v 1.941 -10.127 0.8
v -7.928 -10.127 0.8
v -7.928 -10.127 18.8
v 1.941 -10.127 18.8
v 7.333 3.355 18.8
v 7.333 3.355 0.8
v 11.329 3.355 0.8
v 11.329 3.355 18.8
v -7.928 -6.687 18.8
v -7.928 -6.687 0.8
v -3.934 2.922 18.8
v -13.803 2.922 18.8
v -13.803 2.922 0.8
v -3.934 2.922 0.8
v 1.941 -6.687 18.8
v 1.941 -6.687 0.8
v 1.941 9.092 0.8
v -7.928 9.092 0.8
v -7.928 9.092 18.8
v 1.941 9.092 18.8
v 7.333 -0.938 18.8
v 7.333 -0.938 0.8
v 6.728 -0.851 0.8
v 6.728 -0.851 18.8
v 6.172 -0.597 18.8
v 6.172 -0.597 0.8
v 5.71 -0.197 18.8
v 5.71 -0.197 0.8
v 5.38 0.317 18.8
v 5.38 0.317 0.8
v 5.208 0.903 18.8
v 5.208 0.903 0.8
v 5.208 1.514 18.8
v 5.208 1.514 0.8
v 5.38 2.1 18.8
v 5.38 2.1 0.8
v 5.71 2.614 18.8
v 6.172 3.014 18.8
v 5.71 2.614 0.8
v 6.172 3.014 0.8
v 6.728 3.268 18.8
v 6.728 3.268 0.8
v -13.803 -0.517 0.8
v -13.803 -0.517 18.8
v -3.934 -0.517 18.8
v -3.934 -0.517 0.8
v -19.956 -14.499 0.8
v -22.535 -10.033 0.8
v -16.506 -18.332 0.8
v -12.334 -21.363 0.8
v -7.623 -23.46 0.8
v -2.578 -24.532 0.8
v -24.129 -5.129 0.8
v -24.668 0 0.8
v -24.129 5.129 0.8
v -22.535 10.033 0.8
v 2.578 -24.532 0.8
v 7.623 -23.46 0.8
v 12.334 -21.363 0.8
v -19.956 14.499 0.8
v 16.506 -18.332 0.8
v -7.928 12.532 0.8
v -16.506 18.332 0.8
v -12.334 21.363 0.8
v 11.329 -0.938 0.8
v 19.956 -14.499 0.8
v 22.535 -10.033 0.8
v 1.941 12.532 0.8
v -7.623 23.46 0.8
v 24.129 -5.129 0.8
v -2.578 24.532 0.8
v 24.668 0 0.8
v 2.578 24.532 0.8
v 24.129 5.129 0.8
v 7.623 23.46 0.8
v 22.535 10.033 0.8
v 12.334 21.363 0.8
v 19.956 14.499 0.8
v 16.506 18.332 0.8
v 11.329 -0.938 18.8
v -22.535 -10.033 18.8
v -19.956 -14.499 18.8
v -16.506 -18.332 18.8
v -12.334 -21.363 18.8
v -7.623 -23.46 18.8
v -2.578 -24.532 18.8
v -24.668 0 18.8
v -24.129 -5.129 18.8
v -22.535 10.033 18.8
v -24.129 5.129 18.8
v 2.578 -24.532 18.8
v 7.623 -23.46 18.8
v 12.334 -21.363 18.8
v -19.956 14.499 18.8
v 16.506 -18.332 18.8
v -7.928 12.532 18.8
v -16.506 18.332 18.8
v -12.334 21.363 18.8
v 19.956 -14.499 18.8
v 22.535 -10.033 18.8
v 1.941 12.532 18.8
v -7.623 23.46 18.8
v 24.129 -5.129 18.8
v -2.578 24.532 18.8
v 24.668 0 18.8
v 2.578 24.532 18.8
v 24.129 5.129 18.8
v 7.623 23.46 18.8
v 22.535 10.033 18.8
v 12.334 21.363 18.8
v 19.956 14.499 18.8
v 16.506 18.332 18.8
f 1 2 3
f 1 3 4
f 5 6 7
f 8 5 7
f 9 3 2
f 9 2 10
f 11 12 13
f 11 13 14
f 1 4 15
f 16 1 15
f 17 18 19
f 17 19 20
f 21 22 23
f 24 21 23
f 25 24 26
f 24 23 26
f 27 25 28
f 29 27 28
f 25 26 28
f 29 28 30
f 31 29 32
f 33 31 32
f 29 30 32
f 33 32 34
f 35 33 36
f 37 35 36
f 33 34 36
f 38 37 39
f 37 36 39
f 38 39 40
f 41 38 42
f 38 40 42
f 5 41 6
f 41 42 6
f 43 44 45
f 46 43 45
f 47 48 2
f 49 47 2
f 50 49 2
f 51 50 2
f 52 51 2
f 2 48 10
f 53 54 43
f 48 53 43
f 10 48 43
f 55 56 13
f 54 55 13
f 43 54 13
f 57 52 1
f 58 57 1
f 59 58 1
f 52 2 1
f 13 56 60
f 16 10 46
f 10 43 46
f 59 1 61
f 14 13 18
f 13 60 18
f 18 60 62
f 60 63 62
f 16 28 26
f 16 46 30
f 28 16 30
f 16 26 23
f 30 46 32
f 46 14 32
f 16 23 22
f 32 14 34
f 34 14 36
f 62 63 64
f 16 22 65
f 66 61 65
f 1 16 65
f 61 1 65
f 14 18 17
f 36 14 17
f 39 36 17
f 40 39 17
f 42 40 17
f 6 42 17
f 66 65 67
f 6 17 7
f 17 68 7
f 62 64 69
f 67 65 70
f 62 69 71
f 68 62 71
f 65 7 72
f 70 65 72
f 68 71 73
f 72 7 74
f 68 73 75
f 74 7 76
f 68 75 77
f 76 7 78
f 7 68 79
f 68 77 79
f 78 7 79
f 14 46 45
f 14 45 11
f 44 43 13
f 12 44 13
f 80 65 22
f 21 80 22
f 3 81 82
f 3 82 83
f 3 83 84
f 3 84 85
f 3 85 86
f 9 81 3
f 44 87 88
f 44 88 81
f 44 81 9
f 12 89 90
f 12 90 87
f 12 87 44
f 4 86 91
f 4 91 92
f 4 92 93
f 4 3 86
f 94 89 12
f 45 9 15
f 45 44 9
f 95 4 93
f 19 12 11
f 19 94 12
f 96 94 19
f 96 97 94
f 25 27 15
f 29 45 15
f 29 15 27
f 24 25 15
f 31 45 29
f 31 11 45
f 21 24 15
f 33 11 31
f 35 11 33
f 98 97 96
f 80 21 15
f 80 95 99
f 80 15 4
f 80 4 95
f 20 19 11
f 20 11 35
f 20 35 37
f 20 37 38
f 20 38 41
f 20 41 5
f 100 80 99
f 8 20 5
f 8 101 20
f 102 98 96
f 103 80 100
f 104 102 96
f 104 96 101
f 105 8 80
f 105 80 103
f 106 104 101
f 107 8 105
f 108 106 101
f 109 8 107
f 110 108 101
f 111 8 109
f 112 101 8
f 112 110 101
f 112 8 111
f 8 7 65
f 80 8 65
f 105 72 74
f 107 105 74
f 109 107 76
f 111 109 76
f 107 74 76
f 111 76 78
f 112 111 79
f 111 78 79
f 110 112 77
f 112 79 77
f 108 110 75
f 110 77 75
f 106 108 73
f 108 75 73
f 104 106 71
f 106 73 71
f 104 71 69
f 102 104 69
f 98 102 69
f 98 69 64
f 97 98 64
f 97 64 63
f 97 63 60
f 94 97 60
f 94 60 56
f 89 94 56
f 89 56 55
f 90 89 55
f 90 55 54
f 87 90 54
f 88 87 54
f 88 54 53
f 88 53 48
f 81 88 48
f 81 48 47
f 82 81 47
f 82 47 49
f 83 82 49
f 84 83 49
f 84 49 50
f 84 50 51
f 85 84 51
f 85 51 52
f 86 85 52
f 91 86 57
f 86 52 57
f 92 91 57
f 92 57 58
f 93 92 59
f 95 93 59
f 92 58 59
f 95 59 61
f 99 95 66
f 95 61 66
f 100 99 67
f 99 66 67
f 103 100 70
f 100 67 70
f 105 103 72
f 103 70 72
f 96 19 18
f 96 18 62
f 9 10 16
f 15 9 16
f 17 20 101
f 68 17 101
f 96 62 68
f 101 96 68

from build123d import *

# Parameters (mm, degrees)
F0_R     = 24.66759
F0_W     = 9.8689098377
F0_H     = 3.4395875409
F0_W_2   = 9.86891
F0_H_2   = 3.43959
F1_DEPTH = 18.8
F2_DEPTH = 0.8


# Not quite as in the source:
# - a feature names something its author has since deleted; it is built from what else it names


with BuildPart() as f1:
    # F0 (on Top) → F1 (new body)
    with BuildSketch(Plane.XY):
        Circle(F0_R)
        with Locations((-2.9931267491, -8.4071261808)):
            Rectangle(F0_W, F0_H, mode=Mode.SUBTRACT)
        with Locations((-8.8684857703, 1.2023462914)):
            Rectangle(F0_W_2, F0_H_2, mode=Mode.SUBTRACT)
        with Locations((-2.9931267491, 10.8118187636)):
            Rectangle(F0_W, F0_H, mode=Mode.SUBTRACT)
        with BuildLine():
            Line((11.3292662427, 3.3551587258), (11.3292662427, -0.9376045782))
            Line((11.3292662427, -0.9376045782), (7.332555484, -0.9376045782))
            ThreePointArc((7.332555484, -0.9376045782), (5.186173832, 1.2087770738), (7.332555484, 3.3551587258))
            Line((7.332555484, 3.3551587258), (11.3292662427, 3.3551587258))
        make_face(mode=Mode.SUBTRACT)
    extrude(amount=F1_DEPTH)

    # F0 (on Top) → F2 (cut)
    with BuildSketch(Plane.XY):
        Circle(F0_R)
        with Locations((-2.9931267491, -8.4071261808)):
            Rectangle(F0_W, F0_H, mode=Mode.SUBTRACT)
        with Locations((-8.8684857703, 1.2023462914)):
            Rectangle(F0_W_2, F0_H_2, mode=Mode.SUBTRACT)
        with Locations((-2.9931267491, 10.8118187636)):
            Rectangle(F0_W, F0_H, mode=Mode.SUBTRACT)
        with BuildLine():
            Line((11.3292662427, 3.3551587258), (11.3292662427, -0.9376045782))
            Line((11.3292662427, -0.9376045782), (7.332555484, -0.9376045782))
            ThreePointArc((7.332555484, -0.9376045782), (5.186173832, 1.2087770738), (7.332555484, 3.3551587258))
            Line((7.332555484, 3.3551587258), (11.3292662427, 3.3551587258))
        make_face(mode=Mode.SUBTRACT)
        with Locations((-2.9931267491, -8.4071261808)):
            Rectangle(F0_W, F0_H)
    extrude(amount=F2_DEPTH, mode=Mode.SUBTRACT)


solid = f1.part
